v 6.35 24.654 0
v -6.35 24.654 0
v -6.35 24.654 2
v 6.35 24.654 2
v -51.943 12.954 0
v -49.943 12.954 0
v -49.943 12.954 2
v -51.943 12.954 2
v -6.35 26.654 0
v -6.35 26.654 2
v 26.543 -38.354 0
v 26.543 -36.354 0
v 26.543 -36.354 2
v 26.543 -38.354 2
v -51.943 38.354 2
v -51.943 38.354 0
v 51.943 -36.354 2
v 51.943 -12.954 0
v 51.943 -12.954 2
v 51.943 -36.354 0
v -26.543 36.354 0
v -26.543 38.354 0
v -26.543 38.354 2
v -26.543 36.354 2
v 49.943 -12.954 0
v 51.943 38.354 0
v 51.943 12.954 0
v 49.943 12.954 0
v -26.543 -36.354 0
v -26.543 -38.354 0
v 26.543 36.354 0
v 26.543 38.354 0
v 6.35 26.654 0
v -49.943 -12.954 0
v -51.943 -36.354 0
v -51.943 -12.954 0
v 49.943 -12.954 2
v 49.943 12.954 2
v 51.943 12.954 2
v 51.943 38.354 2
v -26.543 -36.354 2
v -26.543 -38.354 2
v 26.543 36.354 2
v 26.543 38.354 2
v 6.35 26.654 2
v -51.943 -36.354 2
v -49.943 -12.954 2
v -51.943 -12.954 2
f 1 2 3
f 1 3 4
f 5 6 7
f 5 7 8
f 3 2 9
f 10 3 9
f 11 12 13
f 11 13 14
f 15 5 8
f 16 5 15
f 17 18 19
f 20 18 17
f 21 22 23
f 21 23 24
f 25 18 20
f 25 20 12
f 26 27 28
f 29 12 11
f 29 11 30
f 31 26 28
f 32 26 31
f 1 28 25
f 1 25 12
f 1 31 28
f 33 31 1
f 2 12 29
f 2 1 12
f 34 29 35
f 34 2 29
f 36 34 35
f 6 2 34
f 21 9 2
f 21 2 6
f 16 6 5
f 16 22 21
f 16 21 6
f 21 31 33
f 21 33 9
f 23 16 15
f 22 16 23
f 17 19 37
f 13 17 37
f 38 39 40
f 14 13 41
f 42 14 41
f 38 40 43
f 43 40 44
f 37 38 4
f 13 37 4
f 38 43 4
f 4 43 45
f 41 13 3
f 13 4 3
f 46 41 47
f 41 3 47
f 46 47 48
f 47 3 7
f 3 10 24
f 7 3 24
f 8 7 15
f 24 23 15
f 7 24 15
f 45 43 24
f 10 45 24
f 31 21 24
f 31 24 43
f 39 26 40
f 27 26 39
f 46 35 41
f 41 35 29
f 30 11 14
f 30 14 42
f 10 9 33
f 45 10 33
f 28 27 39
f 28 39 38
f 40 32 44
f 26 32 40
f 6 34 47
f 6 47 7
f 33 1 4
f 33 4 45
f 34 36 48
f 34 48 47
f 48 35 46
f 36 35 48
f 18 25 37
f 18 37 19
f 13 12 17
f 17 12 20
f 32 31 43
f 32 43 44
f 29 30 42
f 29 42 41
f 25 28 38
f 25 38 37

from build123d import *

# Parameters (mm, degrees)
SKETCH1_W           = 12.7
SKETCH1_H           = 2
BOSS_EXTRUDE1_DEPTH = 2


with BuildPart() as part:
    # Sketch1 → Boss-Extrude1 (new body)
    with BuildSketch(Plane.XY):
        Polygon((-26.543, 36.354), (26.543, 36.354), (26.543, 38.354), (51.943, 38.354), (51.943, 12.954), (49.943, 12.954), (49.943, -12.954), (51.943, -12.954), (51.943, -36.354), (49.943, -36.354), (26.543, -36.354), (26.543, -38.354), (-26.543, -38.354), (-26.543, -36.354), (-49.943, -36.354), (-51.943, -36.354), (-51.943, -12.954), (-49.943, -12.954), (-49.943, 12.954), (-51.943, 12.954), (-51.943, 38.354), (-26.543, 38.354), align=None)
        with Locations((0, 25.654)):
            Rectangle(SKETCH1_W, SKETCH1_H, mode=Mode.SUBTRACT)
    extrude(amount=BOSS_EXTRUDE1_DEPTH)


solid = part.part
